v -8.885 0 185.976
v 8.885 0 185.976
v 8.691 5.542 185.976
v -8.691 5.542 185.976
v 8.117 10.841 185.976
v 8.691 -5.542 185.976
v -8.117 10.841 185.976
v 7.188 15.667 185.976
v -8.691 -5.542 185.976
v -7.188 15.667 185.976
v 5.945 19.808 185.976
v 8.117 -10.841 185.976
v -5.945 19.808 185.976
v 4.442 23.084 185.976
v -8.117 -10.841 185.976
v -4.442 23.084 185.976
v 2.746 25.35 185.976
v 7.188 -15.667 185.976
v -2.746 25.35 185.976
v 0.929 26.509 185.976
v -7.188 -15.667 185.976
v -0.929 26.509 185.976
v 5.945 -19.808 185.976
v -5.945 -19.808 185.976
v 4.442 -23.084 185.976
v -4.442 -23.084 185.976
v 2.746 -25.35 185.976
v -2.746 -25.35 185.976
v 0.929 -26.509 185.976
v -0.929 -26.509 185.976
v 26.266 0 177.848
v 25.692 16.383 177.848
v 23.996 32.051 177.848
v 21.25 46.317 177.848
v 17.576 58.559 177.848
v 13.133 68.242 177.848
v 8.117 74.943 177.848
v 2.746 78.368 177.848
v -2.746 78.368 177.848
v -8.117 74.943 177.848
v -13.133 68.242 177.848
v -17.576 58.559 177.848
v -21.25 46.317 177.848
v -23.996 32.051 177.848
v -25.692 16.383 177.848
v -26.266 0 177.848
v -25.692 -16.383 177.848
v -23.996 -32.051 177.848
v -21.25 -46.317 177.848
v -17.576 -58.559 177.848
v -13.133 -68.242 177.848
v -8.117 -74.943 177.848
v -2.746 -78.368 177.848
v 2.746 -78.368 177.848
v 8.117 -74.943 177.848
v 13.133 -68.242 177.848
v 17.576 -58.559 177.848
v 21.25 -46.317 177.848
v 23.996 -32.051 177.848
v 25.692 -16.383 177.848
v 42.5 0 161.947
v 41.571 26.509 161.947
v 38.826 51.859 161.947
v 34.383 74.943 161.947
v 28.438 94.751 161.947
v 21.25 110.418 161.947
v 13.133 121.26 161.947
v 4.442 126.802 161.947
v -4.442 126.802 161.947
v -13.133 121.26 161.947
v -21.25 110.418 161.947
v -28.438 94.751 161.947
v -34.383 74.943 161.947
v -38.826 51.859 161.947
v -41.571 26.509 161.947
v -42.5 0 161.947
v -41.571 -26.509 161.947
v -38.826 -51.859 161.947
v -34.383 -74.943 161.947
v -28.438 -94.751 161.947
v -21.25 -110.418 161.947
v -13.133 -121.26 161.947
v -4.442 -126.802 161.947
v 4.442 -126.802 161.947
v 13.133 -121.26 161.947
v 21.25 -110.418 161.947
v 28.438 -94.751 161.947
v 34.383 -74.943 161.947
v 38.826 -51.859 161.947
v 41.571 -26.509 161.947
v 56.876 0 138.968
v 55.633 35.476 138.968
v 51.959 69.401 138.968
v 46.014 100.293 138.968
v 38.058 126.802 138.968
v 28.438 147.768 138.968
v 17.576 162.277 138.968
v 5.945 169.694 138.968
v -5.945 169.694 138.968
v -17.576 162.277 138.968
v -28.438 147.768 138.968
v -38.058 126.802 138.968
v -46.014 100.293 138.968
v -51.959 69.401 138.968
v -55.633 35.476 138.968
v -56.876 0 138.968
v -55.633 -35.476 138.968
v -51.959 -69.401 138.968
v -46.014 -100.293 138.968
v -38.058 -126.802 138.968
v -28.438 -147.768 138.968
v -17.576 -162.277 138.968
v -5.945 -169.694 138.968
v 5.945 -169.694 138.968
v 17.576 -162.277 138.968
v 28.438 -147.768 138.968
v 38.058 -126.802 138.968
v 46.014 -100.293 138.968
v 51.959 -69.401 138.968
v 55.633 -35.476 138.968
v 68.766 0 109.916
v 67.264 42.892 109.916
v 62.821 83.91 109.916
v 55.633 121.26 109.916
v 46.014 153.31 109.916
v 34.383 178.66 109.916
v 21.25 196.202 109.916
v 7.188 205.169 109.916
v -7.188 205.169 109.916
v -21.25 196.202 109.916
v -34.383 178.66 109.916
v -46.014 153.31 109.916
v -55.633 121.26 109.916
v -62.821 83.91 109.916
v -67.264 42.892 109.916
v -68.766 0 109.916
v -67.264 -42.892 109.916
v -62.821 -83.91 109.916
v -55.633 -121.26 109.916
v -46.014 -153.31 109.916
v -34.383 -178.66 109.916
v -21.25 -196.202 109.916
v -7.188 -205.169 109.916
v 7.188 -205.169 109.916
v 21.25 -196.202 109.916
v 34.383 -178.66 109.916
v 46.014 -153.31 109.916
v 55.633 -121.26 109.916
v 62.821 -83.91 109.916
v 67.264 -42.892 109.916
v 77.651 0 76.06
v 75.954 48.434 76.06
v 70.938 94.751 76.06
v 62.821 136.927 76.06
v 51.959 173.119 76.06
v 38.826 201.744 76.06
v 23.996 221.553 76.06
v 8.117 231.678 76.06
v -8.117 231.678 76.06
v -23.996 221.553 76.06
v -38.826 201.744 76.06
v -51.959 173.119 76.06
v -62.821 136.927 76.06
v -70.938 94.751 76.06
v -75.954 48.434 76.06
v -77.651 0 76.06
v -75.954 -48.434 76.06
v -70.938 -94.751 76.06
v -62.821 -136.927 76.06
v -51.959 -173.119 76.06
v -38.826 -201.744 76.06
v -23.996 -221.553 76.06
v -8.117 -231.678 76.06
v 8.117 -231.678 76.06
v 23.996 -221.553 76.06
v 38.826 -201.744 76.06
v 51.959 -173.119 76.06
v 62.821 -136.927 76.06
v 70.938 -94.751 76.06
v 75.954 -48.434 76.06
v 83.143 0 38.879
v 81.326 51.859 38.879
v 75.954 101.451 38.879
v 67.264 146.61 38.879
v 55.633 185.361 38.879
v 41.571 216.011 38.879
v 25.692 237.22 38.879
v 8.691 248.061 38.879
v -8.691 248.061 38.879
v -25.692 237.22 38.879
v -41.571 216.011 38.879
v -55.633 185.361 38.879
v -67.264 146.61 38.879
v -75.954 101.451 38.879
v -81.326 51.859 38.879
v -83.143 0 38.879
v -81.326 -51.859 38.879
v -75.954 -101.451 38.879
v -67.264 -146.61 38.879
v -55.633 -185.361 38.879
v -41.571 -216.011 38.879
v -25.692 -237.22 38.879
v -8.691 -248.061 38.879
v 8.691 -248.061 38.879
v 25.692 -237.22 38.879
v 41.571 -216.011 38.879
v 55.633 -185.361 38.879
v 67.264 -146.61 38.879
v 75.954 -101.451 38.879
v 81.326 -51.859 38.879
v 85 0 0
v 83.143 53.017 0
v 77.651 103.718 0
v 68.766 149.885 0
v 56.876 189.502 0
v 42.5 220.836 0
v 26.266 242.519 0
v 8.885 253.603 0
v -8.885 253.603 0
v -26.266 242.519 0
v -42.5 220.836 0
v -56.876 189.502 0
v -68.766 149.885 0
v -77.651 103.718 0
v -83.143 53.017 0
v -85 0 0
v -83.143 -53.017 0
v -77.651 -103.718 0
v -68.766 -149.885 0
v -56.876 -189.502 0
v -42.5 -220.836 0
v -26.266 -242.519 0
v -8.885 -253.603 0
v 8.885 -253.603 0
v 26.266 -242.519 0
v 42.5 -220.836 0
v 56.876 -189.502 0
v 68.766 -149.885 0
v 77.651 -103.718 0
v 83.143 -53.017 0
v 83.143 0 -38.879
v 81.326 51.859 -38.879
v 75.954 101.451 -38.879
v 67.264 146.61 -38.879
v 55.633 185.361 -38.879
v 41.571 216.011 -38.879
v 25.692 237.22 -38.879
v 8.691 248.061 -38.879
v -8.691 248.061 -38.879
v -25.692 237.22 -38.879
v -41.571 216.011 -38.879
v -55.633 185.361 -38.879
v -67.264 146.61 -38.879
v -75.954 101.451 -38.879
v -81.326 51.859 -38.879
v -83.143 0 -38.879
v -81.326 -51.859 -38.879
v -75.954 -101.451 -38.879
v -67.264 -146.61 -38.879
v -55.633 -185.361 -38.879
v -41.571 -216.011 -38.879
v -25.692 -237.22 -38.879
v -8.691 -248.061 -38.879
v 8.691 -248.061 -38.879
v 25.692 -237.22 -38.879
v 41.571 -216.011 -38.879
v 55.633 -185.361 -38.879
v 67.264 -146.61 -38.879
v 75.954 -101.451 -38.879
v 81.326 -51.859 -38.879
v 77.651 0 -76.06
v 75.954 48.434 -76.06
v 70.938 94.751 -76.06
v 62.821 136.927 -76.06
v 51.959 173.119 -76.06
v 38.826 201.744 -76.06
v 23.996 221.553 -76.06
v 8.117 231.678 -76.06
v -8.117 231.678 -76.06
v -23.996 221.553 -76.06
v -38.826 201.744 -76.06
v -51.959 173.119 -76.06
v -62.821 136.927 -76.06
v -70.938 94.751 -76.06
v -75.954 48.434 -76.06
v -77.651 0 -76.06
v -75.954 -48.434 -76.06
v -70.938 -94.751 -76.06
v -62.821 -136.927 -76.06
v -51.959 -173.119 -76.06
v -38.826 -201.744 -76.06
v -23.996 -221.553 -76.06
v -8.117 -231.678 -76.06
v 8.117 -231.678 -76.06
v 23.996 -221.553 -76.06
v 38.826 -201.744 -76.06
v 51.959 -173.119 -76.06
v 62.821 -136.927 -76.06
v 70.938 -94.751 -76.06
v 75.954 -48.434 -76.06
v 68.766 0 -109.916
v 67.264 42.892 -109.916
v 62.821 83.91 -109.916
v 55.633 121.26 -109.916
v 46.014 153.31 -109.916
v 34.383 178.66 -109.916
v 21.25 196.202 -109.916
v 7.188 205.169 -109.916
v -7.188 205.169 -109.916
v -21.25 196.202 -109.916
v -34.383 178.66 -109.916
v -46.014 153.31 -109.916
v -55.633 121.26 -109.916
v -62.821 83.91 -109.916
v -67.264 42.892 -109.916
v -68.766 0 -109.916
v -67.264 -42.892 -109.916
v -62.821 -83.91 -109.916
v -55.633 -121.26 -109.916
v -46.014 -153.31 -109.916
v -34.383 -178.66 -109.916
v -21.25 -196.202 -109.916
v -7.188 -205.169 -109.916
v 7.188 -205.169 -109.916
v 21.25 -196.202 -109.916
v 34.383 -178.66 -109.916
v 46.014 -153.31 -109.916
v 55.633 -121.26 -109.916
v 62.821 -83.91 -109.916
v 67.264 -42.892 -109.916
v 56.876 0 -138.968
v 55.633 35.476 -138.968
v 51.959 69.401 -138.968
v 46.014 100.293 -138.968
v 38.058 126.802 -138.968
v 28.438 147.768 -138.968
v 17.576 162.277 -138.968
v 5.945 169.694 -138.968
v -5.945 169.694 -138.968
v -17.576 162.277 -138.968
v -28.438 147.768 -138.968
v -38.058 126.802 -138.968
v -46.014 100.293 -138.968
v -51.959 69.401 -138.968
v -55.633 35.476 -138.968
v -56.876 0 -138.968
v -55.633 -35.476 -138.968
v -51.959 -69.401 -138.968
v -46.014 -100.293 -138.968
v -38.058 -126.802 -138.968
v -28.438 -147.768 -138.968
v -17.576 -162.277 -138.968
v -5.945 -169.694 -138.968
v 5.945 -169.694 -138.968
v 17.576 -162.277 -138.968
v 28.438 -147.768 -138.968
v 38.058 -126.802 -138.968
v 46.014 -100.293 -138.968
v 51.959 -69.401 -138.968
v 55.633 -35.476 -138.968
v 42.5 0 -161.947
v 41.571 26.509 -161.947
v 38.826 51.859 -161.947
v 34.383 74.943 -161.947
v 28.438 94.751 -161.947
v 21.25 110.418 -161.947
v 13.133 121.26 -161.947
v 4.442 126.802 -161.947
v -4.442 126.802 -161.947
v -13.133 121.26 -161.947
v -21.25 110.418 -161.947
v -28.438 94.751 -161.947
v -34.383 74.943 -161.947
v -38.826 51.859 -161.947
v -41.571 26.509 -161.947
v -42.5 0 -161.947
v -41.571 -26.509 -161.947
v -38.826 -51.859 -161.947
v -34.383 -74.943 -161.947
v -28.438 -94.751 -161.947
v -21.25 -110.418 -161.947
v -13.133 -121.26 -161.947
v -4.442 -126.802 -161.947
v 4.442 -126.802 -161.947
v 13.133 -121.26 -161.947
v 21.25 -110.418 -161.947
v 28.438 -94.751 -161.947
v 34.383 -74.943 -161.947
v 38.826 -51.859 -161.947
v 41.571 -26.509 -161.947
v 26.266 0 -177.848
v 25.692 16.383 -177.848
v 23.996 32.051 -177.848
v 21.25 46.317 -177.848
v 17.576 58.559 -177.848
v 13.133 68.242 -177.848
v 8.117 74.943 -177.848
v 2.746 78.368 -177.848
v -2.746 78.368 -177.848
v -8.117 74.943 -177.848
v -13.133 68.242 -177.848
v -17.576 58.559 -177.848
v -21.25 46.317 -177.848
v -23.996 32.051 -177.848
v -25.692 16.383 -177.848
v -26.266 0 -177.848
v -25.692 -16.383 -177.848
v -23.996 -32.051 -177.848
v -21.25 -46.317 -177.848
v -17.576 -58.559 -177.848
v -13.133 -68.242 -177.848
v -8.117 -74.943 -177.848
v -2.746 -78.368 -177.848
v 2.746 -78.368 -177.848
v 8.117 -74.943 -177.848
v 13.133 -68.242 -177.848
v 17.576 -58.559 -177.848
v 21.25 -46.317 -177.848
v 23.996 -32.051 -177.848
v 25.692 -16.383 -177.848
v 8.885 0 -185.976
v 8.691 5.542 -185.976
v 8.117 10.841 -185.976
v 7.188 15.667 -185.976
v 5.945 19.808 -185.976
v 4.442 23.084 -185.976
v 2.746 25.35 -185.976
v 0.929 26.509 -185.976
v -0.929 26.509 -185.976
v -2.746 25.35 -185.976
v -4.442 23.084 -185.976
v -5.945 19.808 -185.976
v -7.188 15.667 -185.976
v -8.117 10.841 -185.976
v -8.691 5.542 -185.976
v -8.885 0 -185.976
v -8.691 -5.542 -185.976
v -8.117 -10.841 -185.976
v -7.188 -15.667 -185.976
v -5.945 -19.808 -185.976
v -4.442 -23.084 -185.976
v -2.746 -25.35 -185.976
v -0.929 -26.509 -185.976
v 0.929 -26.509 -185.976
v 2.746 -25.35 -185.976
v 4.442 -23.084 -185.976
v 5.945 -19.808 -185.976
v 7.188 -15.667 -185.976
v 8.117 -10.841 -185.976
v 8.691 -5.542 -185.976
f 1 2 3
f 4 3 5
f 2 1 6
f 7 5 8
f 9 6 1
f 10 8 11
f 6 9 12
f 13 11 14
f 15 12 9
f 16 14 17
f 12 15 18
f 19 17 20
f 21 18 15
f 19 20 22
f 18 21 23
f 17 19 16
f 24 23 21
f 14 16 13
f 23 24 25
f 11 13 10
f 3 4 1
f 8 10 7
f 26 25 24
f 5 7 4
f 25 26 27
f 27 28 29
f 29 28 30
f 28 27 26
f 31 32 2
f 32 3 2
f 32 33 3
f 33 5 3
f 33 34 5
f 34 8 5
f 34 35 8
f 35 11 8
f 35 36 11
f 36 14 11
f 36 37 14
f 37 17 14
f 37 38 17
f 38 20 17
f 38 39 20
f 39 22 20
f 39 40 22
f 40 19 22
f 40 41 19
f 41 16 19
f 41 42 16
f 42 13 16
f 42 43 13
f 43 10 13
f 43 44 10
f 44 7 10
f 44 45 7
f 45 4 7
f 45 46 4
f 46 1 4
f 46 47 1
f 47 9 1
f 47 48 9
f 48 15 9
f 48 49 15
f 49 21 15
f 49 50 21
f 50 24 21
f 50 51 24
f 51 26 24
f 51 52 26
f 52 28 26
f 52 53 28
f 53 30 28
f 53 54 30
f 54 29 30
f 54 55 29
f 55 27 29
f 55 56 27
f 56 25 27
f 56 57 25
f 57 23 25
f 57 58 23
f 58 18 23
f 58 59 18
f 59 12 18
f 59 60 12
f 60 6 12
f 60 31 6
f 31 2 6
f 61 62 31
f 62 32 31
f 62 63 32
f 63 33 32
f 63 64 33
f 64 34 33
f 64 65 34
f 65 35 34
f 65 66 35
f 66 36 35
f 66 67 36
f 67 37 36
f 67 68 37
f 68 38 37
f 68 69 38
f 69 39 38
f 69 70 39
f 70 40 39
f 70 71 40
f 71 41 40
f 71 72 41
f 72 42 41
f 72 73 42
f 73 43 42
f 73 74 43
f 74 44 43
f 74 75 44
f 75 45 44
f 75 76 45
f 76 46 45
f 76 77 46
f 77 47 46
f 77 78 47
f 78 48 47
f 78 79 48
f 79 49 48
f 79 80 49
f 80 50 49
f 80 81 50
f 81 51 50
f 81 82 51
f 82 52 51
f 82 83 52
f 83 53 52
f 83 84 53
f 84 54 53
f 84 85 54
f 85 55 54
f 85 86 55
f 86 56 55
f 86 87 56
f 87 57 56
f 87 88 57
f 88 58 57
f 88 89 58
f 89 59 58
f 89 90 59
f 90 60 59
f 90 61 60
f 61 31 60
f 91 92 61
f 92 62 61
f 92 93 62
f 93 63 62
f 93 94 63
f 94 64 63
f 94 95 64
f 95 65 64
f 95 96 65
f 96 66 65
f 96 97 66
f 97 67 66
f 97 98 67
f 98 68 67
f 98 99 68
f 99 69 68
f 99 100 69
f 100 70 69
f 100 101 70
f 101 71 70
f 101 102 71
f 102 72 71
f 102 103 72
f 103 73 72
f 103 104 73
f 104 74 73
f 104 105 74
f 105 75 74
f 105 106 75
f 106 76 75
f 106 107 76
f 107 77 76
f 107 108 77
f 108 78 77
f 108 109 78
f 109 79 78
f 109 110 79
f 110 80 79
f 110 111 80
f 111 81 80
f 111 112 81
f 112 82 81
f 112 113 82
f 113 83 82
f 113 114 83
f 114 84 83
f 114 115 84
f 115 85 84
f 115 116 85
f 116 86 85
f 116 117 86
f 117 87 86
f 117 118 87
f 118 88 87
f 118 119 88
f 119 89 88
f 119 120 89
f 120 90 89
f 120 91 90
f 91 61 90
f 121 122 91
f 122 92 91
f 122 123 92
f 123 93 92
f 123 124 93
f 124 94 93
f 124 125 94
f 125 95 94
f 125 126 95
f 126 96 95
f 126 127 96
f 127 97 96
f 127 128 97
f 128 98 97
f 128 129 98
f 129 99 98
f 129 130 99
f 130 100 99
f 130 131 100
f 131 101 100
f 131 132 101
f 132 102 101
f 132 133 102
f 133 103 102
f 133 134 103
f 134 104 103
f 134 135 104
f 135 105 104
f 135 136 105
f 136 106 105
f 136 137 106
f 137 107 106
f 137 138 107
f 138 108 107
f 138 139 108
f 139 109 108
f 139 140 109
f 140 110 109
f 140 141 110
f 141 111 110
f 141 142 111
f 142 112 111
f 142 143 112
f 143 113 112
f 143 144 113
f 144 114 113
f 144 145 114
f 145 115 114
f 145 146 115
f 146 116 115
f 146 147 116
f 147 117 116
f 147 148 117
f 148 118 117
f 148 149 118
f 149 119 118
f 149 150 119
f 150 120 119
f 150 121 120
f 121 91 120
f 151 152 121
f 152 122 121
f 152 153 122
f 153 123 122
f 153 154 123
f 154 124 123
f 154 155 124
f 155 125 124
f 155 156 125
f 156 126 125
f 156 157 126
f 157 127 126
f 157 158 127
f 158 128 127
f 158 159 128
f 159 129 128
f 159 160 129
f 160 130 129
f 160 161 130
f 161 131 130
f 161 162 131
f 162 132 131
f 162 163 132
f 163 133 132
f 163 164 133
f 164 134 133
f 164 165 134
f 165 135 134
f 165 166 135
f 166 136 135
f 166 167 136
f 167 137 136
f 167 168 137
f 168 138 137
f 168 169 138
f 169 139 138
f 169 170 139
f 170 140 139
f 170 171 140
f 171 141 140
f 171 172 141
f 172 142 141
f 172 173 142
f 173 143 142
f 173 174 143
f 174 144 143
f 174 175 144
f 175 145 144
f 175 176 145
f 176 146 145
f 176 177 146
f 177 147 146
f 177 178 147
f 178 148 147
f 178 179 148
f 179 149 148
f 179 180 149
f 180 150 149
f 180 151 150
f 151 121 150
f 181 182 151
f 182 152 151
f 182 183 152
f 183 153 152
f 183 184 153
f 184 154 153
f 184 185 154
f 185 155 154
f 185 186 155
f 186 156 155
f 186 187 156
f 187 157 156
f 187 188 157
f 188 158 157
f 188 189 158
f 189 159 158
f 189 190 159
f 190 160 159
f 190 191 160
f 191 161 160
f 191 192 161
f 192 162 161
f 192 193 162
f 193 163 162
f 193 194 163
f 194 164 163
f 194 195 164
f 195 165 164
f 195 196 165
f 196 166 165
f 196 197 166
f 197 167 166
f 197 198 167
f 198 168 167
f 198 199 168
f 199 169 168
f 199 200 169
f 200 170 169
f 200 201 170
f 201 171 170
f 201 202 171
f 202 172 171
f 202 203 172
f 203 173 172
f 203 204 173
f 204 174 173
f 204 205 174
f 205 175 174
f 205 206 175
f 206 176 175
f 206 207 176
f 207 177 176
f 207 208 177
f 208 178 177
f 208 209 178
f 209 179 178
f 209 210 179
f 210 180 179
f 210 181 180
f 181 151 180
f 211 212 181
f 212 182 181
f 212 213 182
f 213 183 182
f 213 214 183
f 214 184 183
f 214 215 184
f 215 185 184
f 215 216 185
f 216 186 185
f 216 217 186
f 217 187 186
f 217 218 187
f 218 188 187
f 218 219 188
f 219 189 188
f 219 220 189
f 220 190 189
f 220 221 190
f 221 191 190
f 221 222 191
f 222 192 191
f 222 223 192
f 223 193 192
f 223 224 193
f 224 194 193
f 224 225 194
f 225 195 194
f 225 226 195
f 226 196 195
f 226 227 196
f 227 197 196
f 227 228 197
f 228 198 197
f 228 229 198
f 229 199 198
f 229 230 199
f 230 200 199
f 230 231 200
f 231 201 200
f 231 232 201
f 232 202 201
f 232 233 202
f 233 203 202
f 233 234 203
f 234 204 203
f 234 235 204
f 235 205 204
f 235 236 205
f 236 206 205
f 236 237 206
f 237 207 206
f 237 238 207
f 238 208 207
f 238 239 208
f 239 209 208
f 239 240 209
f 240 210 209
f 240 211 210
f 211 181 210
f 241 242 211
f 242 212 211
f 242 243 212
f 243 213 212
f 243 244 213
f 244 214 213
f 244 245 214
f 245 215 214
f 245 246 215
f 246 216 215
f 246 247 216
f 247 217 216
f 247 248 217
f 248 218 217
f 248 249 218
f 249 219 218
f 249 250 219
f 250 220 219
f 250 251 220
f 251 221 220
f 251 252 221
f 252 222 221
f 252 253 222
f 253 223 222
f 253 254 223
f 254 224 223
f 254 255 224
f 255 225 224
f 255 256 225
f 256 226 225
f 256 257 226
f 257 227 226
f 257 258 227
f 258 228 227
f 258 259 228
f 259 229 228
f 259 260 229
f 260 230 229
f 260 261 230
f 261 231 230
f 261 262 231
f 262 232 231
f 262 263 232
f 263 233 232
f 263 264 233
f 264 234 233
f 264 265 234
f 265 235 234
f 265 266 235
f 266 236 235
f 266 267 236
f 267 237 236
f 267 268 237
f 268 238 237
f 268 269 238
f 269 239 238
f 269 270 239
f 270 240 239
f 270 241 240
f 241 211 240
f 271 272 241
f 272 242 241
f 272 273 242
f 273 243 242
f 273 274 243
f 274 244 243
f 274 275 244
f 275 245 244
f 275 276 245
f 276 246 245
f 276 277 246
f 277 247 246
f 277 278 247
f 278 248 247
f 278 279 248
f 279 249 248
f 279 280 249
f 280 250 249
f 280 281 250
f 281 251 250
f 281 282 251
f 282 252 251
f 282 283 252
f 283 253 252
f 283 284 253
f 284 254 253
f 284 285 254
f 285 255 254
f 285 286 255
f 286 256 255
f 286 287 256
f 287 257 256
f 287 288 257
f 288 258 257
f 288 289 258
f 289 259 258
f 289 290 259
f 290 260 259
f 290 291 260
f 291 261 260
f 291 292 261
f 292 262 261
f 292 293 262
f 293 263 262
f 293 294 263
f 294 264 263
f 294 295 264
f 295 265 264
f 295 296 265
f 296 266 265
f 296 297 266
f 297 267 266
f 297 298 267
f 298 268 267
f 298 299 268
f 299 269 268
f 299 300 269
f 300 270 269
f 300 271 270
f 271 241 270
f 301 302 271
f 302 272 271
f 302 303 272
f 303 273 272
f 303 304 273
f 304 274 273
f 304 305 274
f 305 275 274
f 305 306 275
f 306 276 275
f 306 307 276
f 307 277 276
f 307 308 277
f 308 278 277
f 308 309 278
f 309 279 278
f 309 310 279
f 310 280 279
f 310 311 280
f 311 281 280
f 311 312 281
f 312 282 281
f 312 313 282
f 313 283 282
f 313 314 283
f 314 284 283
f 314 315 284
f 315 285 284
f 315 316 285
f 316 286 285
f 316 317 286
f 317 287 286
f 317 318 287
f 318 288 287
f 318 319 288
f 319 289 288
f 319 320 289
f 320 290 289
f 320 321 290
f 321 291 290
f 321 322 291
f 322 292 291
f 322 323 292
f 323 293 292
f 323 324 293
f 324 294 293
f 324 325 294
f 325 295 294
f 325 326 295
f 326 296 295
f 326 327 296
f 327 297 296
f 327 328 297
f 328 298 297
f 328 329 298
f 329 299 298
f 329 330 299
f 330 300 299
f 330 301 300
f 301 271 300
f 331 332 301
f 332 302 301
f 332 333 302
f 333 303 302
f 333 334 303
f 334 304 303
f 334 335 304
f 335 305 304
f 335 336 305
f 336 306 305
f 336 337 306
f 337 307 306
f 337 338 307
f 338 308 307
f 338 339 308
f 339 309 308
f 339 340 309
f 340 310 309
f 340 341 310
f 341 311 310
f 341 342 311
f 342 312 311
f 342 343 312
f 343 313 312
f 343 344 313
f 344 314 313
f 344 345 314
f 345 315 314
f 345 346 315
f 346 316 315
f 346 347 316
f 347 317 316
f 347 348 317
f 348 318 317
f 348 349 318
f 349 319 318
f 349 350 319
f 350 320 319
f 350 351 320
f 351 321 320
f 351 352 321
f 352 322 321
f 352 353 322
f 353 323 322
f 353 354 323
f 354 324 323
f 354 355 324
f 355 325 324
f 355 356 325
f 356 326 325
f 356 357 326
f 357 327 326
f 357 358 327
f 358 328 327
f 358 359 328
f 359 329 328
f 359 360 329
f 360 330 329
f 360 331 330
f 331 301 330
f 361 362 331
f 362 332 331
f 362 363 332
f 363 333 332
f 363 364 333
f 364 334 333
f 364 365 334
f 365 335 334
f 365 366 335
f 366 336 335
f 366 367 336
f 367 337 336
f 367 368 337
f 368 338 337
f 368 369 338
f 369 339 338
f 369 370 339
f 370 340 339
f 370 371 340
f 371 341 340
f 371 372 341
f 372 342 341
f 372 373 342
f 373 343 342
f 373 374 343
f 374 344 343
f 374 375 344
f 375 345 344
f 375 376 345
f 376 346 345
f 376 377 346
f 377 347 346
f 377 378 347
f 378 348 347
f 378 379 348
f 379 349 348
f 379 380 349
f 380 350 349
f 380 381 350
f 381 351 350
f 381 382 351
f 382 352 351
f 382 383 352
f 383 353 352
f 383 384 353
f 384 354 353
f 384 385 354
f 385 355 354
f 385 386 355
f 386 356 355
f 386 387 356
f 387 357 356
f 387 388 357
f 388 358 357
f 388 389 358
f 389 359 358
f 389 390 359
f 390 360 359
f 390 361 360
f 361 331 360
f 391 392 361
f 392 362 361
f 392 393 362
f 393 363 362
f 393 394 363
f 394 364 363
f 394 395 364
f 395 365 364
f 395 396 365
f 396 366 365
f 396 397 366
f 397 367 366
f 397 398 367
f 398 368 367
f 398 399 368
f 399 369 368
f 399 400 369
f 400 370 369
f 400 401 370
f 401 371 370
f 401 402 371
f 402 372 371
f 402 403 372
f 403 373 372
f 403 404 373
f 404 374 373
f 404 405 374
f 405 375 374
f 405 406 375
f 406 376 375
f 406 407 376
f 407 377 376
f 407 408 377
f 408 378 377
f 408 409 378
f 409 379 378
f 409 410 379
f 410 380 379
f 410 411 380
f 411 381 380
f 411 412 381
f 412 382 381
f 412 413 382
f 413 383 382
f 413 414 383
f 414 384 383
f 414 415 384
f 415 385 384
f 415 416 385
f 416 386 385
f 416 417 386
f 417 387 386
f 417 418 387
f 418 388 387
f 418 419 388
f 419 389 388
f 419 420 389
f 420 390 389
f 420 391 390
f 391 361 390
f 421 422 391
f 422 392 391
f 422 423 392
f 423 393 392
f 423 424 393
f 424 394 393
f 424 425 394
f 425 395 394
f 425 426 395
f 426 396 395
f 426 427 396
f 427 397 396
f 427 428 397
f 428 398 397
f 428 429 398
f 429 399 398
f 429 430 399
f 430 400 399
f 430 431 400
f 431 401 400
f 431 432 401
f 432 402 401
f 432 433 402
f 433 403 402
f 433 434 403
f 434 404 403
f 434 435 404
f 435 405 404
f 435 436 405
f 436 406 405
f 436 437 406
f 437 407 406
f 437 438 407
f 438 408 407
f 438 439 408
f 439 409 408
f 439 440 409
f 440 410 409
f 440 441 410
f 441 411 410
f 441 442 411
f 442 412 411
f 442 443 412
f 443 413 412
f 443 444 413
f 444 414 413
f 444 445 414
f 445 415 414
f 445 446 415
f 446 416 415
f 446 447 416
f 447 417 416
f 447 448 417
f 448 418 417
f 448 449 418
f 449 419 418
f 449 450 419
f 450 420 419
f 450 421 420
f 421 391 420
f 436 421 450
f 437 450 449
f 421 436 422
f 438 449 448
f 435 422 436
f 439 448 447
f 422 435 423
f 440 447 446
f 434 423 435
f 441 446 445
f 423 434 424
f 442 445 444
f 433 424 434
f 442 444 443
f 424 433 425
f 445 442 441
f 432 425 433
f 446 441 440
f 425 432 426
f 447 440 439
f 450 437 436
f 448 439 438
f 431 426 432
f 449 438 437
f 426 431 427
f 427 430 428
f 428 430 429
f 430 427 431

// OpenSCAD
// Generated by SolidPython 1.0.1 on 2020-07-29 00:46:46


scale(v = [5, 15, 11]) {
	sphere(r = 17);
}
/***********************************************
*********      SolidPython code:      **********
************************************************
 
# import packages: SolidPython
from solid import *
from solid.utils import *
from itertools import chain, combinations, permutations


class Resize:

    def __init__(self, scad_file):
        self.scad_file = scad_file
        #self.scad_file = import_scad(scad_file)
        # cone/cylinder param:
        self.r1 = 0
        self.r2 = 0
        self.h = 0
        # rectangular prism param:
        self.w = 0
        self.l = 0
        # ellipse param:
        self.r = 0

    # import OpenScad code (file name corresponds to shape)


    # classify shape + parameters
    def assign(self, param1, param2, param3):
        if self.scad_file == 'cone.scad':
            self.r1 = param1
            self.r2 = param2
            self.h = param3
        elif self.scad_file == 'cylinder.scad':
            self.r1 = param1
            self.r2 = param2
            self.h = param3
        elif self.scad_file == 'rectangularPrism.scad':
            self.h = param1
            self.l = param2
            self.w = param3
        else:
            self.r = param1
            self.h = param2

    # resize parameters
    def iterate(self):
        x = range(3, 20, 2)
        i = 1
        if self.scad_file == 'cone.scad':
            tempList = list(permutations(x, 2))
            for temp in tempList:
                param1 = temp[0]
                param2 = temp[1]
                filepath = 'produced_scad_files/' + 'cone' + str(param1) + '_' + str(param2) + '_' + '.scad'
                scad_render_to_file(cylinder(h=param1, r1=param2, r2=0), filepath)

        elif self.scad_file == 'cylinder.scad':
            tempList = list(permutations(x, 3))
            for temp in tempList:
                param1 = temp[0]
                param2 = temp[1]
                filepath = 'produced_scad_files/' + 'cylinder' + str(param1) + '_' + str(param2) + '_' + '.scad'
                scad_render_to_file(cylinder(h=param1, r1=param2, r2=param2), filepath)

        elif self.scad_file == 'rectangularPrism.scad':
            tempList = list(permutations(x, 3))
            for temp in tempList:
                param1 = temp[0]
                param2 = temp[1]
                param3 = temp[2]
                filepath = 'produced_scad_files/' + 'rectangularPrism' + str(param1) + '_' + str(param2) + '_' + str(
                    param3) + '.scad'
                scad_render_to_file(cube(size=(param1, param2, param3)), filepath)

        elif self.scad_file == 'ellipse.scad':
            tempList = list(permutations(x, 4))
            for temp in tempList:
                param1 = temp[0]
                param2 = temp[1]
                param3 = temp[2]
                param4 = temp[3]
                filepath = 'produced_scad_files/' + 'ellipse' + str(param1) + '_' + str(param2) + '_' + str(param3) + '_' + str(param4) + '.scad'
                scad_render_to_file(scale([param1, param2, param3])(sphere(r=param4)), filepath)

    def render_to_scadfile(self):
        scad_render_to_file(scad, 'example.scad') 
 
************************************************/
